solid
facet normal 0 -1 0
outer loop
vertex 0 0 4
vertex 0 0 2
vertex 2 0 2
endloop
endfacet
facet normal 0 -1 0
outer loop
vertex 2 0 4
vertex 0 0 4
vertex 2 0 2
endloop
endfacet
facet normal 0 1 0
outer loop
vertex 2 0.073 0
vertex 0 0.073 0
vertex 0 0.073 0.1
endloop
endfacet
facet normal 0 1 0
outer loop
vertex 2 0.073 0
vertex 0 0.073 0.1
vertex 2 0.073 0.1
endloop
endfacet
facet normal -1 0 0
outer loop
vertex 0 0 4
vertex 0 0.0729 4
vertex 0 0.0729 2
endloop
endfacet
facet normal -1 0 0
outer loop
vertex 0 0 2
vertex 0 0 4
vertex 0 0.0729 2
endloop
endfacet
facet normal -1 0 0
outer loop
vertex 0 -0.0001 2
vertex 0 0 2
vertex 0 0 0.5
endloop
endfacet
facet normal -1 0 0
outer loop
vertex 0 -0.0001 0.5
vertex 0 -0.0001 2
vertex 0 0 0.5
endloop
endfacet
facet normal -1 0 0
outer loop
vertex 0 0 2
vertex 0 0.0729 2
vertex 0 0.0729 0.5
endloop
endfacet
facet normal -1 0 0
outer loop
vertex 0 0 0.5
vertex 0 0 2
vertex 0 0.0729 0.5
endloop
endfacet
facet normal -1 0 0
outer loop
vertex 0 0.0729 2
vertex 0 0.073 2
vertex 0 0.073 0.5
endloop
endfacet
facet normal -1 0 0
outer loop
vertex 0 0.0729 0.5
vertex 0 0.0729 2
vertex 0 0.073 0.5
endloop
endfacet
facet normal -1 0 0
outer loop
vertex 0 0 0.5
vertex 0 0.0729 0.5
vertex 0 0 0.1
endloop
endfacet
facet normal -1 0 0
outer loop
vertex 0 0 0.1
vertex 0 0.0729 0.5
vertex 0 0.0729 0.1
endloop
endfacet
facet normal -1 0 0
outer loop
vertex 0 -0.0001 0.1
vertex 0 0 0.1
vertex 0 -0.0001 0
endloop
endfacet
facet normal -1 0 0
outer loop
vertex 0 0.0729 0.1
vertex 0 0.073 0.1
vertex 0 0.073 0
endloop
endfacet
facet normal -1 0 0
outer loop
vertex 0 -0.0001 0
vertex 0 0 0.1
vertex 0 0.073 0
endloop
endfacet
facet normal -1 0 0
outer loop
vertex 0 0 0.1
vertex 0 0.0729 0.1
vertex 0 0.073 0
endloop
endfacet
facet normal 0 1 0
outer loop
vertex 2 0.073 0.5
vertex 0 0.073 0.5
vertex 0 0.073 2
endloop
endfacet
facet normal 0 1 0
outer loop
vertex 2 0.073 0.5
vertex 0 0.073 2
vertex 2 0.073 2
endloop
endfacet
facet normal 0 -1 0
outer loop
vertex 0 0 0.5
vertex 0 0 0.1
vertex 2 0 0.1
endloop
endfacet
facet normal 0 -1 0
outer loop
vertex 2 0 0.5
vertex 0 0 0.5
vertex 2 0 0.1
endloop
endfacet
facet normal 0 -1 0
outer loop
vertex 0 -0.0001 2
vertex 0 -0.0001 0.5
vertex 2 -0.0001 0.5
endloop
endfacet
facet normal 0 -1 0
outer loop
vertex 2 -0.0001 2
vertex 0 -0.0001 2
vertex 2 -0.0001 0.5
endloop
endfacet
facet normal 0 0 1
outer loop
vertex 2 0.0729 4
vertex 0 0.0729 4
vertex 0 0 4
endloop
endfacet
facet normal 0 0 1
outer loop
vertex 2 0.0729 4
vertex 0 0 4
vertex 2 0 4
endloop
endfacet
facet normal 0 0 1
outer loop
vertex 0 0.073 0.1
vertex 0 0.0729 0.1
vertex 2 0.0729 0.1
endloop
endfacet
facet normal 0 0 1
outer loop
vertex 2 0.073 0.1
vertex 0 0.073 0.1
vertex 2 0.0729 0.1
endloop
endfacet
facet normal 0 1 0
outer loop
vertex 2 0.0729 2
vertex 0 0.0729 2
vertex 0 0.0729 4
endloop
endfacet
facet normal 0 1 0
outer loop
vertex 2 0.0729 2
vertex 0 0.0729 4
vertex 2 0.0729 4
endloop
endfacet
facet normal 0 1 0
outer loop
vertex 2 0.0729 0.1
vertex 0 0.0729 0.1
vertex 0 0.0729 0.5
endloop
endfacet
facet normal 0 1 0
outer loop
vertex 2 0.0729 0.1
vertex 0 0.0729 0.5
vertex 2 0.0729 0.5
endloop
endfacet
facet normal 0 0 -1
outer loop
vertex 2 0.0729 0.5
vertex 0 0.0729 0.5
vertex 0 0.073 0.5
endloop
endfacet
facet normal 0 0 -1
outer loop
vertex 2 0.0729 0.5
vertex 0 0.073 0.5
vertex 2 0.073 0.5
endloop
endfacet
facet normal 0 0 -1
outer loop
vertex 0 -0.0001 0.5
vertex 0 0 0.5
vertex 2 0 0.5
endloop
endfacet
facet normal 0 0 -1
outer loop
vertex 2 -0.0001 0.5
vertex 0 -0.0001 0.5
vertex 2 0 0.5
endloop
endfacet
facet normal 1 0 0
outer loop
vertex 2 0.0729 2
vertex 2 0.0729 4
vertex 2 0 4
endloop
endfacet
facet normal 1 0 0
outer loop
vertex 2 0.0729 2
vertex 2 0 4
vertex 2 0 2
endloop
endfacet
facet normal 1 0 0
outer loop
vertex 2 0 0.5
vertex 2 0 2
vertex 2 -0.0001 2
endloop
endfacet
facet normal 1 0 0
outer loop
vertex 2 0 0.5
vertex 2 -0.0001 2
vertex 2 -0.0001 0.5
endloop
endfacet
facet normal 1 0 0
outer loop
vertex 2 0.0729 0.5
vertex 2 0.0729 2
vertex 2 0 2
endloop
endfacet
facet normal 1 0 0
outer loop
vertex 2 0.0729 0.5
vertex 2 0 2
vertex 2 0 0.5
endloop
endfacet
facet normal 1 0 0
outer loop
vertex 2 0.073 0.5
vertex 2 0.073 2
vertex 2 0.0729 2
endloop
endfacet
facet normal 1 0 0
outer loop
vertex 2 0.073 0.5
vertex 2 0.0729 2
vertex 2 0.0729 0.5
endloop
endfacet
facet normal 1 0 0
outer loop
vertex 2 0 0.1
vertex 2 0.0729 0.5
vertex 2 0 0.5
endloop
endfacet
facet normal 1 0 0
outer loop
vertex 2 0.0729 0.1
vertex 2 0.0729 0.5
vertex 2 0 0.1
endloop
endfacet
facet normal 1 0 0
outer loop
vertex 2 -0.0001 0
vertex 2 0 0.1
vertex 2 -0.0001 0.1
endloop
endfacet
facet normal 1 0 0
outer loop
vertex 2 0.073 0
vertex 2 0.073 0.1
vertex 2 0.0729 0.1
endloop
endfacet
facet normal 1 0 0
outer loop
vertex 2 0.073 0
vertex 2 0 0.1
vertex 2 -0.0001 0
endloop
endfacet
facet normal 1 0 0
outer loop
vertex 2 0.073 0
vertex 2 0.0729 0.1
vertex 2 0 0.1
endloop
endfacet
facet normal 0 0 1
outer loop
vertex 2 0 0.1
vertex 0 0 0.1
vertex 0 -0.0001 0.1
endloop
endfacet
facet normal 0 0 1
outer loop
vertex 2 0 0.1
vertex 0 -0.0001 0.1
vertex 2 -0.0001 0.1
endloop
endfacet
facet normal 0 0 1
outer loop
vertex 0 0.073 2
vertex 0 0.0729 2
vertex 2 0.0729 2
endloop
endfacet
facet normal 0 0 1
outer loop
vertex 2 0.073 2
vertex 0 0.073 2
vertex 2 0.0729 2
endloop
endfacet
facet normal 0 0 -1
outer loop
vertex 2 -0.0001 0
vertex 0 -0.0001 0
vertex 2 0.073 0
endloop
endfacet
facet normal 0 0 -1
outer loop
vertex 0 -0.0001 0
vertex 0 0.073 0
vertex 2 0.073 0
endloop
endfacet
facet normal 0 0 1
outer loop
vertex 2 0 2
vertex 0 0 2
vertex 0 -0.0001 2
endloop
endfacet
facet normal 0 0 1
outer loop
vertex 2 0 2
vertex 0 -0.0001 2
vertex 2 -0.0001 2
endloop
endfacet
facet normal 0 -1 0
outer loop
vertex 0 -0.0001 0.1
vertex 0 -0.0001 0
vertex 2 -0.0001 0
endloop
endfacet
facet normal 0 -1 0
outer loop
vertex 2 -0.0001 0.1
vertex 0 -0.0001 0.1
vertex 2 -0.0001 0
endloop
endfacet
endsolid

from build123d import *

# Parameters (mm, degrees)
SKETCH1_W           = 2
SKETCH1_H           = 0.072865
BOSS_EXTRUDE1_DEPTH = 4
SKETCH7_W           = 2
SKETCH7_H           = 0.1
SKETCH7_H_2         = 1.5
BOSS_EXTRUDE6_DEPTH = 0.0001
BOSS_EXTRUDE7_START = -0.072865
SKETCH7_2_W         = 2
SKETCH7_2_H         = 0.1
SKETCH7_2_H_2       = 1.5
BOSS_EXTRUDE7_DEPTH = 0.0001


with BuildPart() as part:
    # Sketch1 → Boss-Extrude1 (new body)
    with BuildSketch(Plane.XY):
        with Locations((1, 0.0364325)):
            Rectangle(SKETCH1_W, SKETCH1_H)
    extrude(amount=BOSS_EXTRUDE1_DEPTH)

    # Sketch7 → Boss-Extrude6 (add)
    with BuildSketch(Plane(origin=(0, 0.072865, 0), x_dir=(1, 0, 0), z_dir=(0, 1, 0))):
        with Locations((1, -0.05)):
            Rectangle(SKETCH7_W, SKETCH7_H)
        with Locations((1, -1.25)):
            Rectangle(SKETCH7_W, SKETCH7_H_2)
    extrude(amount=BOSS_EXTRUDE6_DEPTH)

    # Sketch7<2> → Boss-Extrude7 (add)
    with BuildSketch(Plane(origin=(0, 0.072865, 0), x_dir=(1, 0, 0), z_dir=(0, 1, 0)).offset(BOSS_EXTRUDE7_START)):
        with Locations((1, -0.05)):
            Rectangle(SKETCH7_2_W, SKETCH7_2_H)
        with Locations((1, -1.25)):
            Rectangle(SKETCH7_2_W, SKETCH7_2_H_2)
    extrude(amount=-BOSS_EXTRUDE7_DEPTH)


solid = part.part
